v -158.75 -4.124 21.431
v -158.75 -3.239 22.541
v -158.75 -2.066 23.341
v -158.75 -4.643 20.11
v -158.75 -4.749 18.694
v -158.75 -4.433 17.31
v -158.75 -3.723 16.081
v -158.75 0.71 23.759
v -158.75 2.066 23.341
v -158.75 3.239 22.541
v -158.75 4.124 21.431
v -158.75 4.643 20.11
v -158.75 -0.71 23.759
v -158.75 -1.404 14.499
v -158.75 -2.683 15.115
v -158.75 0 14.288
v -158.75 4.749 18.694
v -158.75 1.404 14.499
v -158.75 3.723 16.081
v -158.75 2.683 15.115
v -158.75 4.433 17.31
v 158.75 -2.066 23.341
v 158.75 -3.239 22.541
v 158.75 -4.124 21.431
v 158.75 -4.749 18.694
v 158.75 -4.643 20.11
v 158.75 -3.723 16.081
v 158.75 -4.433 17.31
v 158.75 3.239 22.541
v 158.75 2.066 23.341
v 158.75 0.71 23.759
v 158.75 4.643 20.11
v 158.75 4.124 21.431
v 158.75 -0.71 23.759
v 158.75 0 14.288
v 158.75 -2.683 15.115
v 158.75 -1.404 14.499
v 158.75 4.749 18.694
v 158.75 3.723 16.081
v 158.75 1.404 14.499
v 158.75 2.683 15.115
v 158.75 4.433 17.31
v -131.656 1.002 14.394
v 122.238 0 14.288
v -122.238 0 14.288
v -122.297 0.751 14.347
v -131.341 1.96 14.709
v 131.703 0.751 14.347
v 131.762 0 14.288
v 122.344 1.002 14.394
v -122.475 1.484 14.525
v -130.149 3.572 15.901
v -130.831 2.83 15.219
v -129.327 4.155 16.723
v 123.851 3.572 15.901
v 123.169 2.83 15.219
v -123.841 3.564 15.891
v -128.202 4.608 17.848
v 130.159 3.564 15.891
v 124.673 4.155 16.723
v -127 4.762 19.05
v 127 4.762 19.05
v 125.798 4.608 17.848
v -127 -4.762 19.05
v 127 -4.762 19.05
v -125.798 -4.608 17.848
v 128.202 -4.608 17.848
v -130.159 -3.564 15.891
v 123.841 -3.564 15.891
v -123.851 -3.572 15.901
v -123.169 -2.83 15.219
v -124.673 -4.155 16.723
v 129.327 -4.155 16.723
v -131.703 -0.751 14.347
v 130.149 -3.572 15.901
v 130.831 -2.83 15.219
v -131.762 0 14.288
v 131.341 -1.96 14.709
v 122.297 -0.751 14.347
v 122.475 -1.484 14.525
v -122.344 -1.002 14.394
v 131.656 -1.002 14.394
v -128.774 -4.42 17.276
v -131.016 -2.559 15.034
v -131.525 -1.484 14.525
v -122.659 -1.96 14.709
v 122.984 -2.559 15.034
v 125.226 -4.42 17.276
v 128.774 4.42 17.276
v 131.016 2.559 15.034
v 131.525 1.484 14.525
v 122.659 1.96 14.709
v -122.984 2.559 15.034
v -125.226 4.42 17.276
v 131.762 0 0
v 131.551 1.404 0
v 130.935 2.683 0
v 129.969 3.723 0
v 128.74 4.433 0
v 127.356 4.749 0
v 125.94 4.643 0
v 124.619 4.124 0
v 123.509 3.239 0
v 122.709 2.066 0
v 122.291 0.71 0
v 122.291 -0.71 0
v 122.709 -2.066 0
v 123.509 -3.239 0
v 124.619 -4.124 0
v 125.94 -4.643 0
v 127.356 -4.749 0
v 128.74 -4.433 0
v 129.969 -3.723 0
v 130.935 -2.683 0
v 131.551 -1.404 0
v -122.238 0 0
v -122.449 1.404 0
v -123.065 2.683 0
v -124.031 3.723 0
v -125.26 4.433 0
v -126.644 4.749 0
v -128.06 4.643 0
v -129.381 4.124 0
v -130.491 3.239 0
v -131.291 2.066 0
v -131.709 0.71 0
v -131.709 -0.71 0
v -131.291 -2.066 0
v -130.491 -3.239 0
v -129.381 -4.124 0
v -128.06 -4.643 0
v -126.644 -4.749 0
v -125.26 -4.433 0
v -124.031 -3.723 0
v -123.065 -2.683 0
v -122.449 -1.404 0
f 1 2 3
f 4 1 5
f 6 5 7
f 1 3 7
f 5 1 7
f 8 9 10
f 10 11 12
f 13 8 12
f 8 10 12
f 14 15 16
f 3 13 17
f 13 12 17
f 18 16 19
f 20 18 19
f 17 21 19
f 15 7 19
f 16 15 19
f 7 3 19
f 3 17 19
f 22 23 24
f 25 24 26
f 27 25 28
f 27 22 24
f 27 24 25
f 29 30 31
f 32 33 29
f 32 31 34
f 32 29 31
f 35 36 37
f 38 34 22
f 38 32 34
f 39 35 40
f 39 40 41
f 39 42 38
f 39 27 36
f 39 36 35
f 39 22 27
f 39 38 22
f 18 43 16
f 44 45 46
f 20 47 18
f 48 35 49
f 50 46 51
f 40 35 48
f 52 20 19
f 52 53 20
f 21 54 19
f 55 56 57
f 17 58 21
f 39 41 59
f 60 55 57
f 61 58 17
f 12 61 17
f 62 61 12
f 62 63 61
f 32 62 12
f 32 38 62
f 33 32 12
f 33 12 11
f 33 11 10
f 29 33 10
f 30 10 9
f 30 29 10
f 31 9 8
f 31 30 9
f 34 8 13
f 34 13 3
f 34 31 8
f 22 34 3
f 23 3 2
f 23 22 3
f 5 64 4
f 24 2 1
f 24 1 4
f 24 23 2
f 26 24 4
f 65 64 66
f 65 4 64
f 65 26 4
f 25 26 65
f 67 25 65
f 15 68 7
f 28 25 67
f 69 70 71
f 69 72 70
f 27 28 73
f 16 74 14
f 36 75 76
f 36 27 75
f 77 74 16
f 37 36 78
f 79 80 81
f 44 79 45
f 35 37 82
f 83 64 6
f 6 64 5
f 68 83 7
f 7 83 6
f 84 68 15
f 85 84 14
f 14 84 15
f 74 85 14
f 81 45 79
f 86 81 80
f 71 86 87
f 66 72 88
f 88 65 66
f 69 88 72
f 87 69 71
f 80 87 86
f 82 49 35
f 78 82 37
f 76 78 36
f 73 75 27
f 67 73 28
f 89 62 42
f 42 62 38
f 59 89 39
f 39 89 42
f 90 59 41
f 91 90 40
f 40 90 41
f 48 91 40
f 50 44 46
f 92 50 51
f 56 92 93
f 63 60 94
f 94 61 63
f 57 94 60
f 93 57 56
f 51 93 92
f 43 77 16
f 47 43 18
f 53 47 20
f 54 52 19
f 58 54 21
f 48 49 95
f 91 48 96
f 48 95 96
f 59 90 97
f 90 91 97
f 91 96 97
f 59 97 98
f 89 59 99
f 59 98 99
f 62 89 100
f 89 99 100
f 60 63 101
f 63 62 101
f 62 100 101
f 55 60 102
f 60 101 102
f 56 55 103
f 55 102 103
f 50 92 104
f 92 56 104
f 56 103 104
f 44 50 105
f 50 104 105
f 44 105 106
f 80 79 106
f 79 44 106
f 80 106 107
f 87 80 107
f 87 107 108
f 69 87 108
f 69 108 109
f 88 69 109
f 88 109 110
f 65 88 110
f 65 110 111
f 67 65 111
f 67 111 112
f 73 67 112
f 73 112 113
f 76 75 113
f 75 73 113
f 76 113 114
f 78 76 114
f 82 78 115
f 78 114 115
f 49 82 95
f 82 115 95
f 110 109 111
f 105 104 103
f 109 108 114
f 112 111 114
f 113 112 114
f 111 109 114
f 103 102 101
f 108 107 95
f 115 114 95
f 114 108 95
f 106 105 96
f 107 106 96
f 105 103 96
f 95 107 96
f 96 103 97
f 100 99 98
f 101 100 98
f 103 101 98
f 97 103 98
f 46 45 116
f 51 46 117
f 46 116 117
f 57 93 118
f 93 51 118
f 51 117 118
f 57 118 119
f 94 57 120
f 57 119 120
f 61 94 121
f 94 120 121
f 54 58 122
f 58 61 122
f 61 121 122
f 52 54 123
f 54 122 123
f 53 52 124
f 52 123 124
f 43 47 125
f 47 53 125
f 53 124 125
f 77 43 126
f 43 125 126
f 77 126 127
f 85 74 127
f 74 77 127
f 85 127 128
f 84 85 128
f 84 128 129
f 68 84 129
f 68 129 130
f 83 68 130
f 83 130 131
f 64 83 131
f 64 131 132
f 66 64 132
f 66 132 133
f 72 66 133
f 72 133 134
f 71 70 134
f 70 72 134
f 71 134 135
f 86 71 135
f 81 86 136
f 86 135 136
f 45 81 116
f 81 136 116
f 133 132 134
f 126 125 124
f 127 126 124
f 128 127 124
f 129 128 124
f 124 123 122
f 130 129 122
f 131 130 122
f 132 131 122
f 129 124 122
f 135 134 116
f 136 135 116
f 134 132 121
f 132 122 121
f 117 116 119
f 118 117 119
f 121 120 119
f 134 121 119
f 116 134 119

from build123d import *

# Parameters (mm, degrees)
SKETCH2_R           = 4.7625
BOSS_EXTRUDE1_DEPTH = 158.75
BOSS_EXTRUDE2_REACH = 25.812
SKETCH1_R           = 4.7625


with BuildPart() as part:
    # Sketch2 → Boss-Extrude1 (new body, symmetric)
    with BuildSketch(Plane(origin=(0, 0, 0), x_dir=(0, 0, -1), z_dir=(1, 0, 0))):
        with Locations((-19.05, 0)):
            Circle(SKETCH2_R)
    extrude(amount=BOSS_EXTRUDE1_DEPTH, both=True)

    # Sketch1 → Boss-Extrude2 (add, up to next)
    with BuildSketch(Plane.XY, mode=Mode.PRIVATE) as boss_extrude2_sk1:
        with Locations((-127, 0)):
            Circle(SKETCH1_R)
    boss_extrude2_tool1 = extrude(boss_extrude2_sk1.sketch, amount=BOSS_EXTRUDE2_REACH, mode=Mode.PRIVATE) - part.part
    add(boss_extrude2_tool1.solids().sort_by_distance((-127, 0, 0))[0])
    # Sketch1 → Boss-Extrude2 (add, up to next)
    with BuildSketch(Plane.XY, mode=Mode.PRIVATE) as boss_extrude2_sk2:
        with Locations((127, 0)):
            Circle(SKETCH1_R)
    boss_extrude2_tool2 = extrude(boss_extrude2_sk2.sketch, amount=BOSS_EXTRUDE2_REACH, mode=Mode.PRIVATE) - part.part
    add(boss_extrude2_tool2.solids().sort_by_distance((127, 0, 0))[0])


solid = part.part
